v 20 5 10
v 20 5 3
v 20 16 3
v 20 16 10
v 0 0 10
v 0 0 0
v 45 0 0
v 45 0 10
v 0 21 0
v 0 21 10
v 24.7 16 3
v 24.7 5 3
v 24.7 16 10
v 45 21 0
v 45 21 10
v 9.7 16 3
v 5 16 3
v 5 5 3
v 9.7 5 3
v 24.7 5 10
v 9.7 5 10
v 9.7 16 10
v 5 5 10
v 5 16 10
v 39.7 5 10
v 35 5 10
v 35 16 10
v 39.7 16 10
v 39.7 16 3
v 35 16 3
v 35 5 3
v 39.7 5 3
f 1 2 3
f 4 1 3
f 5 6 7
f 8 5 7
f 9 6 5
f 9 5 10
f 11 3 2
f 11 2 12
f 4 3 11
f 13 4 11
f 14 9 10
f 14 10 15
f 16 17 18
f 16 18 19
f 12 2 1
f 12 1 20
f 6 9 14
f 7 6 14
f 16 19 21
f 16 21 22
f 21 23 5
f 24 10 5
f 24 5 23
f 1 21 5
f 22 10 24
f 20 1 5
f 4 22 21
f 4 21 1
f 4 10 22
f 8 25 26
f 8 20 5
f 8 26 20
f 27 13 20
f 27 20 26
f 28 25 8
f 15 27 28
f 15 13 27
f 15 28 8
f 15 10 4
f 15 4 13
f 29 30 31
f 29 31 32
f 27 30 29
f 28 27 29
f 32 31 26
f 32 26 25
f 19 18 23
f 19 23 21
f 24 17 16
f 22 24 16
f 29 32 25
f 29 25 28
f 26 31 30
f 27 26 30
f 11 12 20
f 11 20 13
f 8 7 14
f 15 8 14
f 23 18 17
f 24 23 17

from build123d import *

# Parameters (mm, degrees)
BOX001_W     = 4.7
BOX001_H     = 11
BOX001_DEPTH = 12
BOX002_W     = 4.7
BOX002_H     = 11
BOX002_DEPTH = 12
BOX_W        = 4.7
BOX_H        = 11
BOX_DEPTH    = 12
BOX003_W     = 45
BOX003_H     = 21
BOX003_DEPTH = 10


with BuildPart() as box001:
    # Box001 → Box001 (new body)
    with BuildSketch(Plane(origin=(15, 0, 0), x_dir=(1, 0, 0), z_dir=(0, 0, 1))):
        with Locations((2.35, 5.5)):
            Rectangle(BOX001_W, BOX001_H)
    extrude(amount=BOX001_DEPTH)


with BuildPart() as box002:
    # Box002 → Box002 (new body)
    with BuildSketch(Plane(origin=(30, 0, 0), x_dir=(1, 0, 0), z_dir=(0, 0, 1))):
        with Locations((2.35, 5.5)):
            Rectangle(BOX002_W, BOX002_H)
    extrude(amount=BOX002_DEPTH)


with BuildPart() as ranuras:
    # Box → Box (new body)
    with BuildSketch(Plane.XY):
        with Locations((2.35, 5.5)):
            Rectangle(BOX_W, BOX_H)
    extrude(amount=BOX_DEPTH)

    # Fusion: union Box001, Box002
    add(box001.part)
    add(box002.part)


with BuildPart() as ranuras_1:
    # Fusion placement: moved
    add(ranuras.part.moved(Location((5, 5, 3))))


with BuildPart() as porta_pendrives:
    # Box003 → Box003 (new body)
    with BuildSketch(Plane.XY):
        with Locations((22.5, 10.5)):
            Rectangle(BOX003_W, BOX003_H)
    extrude(amount=BOX003_DEPTH)

    # Cut: cut Ranuras
    add(ranuras_1.part, mode=Mode.SUBTRACT)


solid = porta_pendrives.part
